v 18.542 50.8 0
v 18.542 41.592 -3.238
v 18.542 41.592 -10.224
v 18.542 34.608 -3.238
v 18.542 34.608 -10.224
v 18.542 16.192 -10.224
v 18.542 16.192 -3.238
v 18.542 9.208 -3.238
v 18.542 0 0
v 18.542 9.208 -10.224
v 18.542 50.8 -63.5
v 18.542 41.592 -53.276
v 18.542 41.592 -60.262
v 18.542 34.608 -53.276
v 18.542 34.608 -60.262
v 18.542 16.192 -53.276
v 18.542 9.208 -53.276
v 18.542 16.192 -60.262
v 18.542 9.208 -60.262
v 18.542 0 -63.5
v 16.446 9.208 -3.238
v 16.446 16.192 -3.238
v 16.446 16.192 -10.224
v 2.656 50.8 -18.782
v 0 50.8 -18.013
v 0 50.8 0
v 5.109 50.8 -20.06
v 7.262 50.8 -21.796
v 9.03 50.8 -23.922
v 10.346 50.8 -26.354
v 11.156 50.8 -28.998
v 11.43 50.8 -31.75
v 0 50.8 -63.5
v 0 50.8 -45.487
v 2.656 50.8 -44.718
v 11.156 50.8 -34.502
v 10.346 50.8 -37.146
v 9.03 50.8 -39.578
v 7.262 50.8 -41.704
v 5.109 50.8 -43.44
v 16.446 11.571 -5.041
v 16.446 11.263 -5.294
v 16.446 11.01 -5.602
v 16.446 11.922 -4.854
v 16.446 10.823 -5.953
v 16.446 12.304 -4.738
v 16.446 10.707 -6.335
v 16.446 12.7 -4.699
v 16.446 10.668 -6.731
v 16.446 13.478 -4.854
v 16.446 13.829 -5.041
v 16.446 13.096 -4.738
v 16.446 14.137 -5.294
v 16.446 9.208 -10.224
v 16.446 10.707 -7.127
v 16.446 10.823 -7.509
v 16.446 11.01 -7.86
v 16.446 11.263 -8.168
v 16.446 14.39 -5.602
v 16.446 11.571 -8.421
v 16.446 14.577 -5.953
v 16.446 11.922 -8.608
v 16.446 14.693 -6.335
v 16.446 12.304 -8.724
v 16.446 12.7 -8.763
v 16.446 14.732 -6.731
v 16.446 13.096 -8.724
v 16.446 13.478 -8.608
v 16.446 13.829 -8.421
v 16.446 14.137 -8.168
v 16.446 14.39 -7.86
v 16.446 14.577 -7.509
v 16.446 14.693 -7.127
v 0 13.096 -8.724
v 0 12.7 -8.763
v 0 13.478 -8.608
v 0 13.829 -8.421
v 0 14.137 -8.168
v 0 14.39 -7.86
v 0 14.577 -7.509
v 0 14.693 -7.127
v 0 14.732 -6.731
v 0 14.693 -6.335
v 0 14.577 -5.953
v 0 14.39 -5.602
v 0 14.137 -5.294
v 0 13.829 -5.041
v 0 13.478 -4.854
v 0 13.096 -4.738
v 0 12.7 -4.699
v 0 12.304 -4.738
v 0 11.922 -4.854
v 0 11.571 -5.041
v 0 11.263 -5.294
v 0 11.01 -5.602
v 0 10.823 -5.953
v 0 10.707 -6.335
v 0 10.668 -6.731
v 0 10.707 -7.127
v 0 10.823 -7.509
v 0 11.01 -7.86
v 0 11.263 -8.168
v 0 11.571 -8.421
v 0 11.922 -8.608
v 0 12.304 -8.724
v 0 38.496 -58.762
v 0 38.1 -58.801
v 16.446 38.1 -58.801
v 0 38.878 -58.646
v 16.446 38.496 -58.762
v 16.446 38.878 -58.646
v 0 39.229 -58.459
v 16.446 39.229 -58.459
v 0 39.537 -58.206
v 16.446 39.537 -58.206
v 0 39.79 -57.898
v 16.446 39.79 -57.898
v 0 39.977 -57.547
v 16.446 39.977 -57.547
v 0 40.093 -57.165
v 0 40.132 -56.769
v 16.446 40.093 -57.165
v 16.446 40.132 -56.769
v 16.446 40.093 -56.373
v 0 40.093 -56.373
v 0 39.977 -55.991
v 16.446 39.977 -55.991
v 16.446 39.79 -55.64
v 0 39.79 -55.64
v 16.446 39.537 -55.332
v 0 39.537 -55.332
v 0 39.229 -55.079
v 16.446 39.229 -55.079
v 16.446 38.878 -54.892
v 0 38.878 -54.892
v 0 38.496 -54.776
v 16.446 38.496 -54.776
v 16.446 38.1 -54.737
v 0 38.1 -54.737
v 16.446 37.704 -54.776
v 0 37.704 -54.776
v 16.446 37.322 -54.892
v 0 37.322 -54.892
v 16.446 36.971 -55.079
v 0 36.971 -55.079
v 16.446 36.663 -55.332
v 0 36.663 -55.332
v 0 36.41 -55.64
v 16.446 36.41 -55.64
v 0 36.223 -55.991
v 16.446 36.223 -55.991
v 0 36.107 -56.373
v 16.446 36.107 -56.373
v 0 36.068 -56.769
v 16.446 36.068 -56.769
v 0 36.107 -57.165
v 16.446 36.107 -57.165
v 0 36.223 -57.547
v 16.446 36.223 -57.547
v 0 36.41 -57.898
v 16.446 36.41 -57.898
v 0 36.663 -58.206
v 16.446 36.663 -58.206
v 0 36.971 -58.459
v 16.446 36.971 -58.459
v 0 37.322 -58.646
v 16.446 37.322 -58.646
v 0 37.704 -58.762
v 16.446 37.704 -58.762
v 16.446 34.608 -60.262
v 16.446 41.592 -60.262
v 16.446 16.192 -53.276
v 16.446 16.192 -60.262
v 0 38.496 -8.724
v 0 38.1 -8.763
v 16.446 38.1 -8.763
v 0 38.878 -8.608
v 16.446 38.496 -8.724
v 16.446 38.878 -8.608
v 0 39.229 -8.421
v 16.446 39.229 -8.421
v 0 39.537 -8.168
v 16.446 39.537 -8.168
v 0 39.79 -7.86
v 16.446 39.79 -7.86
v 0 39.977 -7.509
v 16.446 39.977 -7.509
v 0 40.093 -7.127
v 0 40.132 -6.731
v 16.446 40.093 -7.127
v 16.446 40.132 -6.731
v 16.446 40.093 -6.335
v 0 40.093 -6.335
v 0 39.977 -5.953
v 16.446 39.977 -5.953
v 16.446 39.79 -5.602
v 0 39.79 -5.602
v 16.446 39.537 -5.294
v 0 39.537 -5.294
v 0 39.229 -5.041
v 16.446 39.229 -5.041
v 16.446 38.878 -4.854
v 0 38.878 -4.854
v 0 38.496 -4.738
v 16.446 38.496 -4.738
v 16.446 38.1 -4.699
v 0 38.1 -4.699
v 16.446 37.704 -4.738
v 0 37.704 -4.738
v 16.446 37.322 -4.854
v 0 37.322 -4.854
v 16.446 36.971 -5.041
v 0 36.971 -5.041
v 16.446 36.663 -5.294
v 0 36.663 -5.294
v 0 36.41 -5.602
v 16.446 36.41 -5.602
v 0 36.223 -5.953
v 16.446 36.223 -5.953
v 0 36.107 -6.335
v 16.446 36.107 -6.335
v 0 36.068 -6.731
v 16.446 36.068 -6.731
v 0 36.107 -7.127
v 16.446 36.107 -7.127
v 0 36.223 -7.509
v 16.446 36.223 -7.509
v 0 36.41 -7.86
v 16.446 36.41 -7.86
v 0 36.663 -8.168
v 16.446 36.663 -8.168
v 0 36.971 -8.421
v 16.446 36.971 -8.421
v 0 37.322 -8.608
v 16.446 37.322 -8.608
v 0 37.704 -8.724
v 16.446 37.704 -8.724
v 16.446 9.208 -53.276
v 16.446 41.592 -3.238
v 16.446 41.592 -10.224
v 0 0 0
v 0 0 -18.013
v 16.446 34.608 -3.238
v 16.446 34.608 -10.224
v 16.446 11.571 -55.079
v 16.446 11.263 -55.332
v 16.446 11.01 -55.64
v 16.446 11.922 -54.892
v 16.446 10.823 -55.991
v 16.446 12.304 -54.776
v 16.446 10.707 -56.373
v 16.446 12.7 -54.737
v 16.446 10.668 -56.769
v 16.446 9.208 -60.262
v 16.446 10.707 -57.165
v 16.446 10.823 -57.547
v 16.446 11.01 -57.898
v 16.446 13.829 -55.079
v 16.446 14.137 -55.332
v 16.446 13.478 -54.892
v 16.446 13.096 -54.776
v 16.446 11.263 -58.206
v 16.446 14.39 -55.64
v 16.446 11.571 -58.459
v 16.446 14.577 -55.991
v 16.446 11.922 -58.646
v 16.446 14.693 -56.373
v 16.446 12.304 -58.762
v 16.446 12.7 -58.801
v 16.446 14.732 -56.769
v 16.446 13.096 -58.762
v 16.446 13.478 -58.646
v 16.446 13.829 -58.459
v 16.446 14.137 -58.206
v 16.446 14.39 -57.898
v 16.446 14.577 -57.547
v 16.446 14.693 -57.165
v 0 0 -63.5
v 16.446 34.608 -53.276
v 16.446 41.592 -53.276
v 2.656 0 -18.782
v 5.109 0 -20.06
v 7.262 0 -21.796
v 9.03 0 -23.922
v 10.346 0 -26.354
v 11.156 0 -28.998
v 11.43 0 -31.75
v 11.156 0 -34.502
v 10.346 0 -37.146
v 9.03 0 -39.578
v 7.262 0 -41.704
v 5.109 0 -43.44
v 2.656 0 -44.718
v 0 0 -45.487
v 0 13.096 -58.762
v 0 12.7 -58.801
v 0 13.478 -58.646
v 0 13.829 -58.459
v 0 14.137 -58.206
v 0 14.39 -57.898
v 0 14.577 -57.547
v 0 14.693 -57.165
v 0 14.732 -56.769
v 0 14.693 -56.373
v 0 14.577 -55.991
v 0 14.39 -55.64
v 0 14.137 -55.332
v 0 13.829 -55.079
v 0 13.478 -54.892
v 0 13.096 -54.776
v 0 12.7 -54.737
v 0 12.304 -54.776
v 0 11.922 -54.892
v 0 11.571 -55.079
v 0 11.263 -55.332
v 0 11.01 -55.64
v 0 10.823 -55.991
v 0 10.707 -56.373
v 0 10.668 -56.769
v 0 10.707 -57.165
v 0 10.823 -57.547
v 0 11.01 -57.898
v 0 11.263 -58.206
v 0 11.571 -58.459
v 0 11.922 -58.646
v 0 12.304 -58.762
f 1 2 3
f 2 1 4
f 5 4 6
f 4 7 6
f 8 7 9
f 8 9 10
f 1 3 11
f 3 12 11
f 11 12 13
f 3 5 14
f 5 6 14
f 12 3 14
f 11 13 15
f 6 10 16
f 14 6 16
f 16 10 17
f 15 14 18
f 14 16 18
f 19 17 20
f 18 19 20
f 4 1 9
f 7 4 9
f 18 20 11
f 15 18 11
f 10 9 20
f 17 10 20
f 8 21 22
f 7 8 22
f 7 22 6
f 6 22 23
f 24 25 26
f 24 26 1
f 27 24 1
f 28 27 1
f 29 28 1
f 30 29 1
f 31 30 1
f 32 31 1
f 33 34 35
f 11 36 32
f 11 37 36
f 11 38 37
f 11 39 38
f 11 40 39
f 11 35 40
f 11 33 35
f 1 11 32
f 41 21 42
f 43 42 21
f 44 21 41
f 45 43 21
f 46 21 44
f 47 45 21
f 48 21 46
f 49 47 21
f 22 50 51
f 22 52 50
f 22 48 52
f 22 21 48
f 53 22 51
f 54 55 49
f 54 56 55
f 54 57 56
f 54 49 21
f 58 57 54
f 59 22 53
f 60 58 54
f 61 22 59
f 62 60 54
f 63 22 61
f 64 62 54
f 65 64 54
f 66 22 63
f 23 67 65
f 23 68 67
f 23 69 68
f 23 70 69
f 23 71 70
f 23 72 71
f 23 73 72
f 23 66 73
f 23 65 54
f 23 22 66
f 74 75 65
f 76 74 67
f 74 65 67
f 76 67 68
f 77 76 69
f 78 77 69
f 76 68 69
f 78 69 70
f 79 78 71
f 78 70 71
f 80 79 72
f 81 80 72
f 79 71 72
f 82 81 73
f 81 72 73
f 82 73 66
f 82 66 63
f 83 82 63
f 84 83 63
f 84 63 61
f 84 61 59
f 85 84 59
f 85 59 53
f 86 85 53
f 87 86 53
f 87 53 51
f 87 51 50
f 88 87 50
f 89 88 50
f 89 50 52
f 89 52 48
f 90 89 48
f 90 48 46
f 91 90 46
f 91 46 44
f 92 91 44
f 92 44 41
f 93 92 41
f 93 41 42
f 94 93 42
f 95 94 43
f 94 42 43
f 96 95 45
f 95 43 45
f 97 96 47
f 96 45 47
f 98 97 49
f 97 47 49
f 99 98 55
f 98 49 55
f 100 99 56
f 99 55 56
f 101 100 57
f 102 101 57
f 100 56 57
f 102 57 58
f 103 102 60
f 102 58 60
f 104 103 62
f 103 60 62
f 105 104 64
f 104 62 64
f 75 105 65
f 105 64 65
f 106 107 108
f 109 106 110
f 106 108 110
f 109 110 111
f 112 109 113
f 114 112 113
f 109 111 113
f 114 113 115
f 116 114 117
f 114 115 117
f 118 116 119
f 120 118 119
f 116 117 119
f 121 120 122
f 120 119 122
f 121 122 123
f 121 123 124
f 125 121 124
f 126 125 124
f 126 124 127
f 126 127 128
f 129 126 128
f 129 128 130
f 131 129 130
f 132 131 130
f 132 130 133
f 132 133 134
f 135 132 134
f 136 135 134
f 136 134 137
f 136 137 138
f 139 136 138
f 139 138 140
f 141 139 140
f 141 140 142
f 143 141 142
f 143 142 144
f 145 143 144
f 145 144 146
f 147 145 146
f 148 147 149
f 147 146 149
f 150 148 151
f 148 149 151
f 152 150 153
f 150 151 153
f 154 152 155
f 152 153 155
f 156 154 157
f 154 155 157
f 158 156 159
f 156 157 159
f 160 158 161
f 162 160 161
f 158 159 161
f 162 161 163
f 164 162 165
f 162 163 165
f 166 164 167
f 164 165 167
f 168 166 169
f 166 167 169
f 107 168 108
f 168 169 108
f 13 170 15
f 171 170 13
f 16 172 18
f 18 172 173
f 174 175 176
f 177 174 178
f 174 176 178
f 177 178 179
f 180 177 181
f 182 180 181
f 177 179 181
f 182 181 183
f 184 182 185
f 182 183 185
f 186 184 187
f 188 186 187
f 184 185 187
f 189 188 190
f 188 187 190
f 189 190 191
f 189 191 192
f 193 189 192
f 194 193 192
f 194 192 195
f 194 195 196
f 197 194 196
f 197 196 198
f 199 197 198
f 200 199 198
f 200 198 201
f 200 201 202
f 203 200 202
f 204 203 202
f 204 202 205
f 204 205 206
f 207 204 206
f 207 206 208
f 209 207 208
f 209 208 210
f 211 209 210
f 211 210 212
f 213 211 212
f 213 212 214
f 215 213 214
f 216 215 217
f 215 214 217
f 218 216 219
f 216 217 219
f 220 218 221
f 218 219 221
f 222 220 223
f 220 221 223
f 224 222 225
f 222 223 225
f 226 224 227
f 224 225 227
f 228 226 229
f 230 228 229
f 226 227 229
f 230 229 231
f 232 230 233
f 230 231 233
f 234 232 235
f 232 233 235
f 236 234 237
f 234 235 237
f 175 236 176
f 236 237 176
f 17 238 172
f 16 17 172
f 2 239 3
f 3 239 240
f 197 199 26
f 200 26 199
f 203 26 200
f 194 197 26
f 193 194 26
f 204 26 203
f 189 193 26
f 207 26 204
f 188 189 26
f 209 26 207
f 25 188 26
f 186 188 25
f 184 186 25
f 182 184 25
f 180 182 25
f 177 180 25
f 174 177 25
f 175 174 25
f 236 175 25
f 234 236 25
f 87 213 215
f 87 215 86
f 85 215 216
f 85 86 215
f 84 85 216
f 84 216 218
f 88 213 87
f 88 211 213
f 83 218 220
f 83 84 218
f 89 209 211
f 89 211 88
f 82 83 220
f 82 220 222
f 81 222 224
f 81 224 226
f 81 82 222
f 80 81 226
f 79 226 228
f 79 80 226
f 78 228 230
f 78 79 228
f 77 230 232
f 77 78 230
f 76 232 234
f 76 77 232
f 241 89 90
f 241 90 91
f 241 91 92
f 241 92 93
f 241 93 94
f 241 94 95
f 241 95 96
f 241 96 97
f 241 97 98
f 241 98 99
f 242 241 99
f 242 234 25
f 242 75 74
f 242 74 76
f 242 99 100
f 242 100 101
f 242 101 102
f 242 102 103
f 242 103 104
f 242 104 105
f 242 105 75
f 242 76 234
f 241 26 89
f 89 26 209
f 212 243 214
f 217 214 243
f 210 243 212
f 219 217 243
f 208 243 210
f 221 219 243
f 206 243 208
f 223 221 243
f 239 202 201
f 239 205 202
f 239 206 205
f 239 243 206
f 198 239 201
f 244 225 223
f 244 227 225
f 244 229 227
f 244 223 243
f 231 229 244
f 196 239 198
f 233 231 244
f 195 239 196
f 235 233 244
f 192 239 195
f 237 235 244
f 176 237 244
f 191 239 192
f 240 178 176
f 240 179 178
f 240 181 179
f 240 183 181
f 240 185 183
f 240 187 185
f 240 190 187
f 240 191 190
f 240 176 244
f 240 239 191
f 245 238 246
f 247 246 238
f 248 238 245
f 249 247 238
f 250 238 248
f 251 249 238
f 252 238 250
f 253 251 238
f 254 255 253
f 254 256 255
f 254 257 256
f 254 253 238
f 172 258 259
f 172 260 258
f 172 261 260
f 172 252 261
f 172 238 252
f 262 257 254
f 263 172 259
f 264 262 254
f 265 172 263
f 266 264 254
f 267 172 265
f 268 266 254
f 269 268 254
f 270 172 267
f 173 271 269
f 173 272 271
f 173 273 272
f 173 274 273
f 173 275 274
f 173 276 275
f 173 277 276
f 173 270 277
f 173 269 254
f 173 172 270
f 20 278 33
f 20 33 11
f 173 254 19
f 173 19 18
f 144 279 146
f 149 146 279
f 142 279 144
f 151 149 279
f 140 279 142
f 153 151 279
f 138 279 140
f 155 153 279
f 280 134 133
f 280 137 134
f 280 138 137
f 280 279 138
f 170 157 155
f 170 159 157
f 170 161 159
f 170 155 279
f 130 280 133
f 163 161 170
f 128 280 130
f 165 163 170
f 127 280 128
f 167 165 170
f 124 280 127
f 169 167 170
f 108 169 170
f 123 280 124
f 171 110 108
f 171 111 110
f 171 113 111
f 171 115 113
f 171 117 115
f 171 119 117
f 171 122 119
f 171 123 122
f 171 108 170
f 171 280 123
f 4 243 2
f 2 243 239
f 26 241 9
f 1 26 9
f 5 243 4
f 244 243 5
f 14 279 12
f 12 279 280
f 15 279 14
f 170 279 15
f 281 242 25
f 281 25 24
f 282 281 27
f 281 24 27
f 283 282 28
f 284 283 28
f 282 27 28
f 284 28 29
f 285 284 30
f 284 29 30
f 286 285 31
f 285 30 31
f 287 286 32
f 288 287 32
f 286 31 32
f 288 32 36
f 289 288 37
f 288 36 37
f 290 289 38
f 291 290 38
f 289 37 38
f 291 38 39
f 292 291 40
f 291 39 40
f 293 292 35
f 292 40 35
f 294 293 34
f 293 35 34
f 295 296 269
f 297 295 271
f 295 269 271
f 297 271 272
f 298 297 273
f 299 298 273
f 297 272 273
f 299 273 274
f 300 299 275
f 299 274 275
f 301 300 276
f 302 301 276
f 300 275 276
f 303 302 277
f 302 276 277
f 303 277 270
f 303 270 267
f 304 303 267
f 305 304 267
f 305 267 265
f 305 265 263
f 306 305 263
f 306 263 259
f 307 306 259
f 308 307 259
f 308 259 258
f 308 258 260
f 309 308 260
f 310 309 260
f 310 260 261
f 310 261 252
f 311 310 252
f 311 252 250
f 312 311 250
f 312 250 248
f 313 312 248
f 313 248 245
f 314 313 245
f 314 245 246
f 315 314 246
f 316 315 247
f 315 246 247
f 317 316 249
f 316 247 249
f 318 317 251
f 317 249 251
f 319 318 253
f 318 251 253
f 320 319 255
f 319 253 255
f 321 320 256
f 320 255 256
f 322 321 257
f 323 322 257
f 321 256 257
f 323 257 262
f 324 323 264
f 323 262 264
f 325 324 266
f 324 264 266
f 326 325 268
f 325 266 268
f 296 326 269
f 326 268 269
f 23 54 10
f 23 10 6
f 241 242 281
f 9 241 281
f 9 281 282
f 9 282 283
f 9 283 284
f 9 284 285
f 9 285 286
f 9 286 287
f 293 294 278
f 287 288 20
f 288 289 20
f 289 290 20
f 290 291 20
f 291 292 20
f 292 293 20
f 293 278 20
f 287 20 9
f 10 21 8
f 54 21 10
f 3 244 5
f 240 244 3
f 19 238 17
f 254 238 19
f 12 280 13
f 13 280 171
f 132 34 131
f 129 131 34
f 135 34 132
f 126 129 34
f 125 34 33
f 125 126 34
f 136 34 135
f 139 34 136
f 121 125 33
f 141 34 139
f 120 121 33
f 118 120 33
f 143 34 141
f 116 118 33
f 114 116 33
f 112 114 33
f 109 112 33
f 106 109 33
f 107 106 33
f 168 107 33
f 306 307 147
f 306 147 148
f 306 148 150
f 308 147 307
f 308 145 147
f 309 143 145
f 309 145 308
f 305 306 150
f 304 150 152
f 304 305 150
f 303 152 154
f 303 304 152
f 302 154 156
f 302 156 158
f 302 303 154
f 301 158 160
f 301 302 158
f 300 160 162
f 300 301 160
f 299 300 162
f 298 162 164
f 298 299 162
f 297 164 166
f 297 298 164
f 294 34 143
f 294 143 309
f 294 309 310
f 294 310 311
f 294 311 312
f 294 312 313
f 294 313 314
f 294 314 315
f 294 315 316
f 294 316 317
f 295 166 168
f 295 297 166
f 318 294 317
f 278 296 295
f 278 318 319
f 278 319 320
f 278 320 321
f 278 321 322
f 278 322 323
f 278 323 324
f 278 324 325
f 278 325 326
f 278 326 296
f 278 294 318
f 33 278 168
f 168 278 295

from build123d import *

# Parameters (mm, degrees)
SKETCH1_W           = 18.542
SKETCH1_H           = 63.5
BOSS_EXTRUDE1_DEPTH = 50.8
CUT_EXTRUDE1_DEPTH  = 50.8
SKETCH4_R           = 2.032
CUT_EXTRUDE3_DEPTH  = 18.542
CUT_EXTRUDE4_START  = -2.0955
SKETCH6_W           = 6.985
SKETCH6_H           = 6.985
CUT_EXTRUDE4_DEPTH  = 2.0955


with BuildPart() as part:
    # Sketch1 → Boss-Extrude1 (new body)
    with BuildSketch(Plane(origin=(0, 0, 0), x_dir=(1, 0, 0), z_dir=(0, 1, 0))):
        with Locations((9.271, 31.75)):
            Rectangle(SKETCH1_W, SKETCH1_H)
    extrude(amount=BOSS_EXTRUDE1_DEPTH)

    # Sketch2 → Cut-Extrude1 (cut)
    with BuildSketch(Plane(origin=(0, 50.8, 0), x_dir=(1, 0, 0), z_dir=(0, 1, 0))):
        with BuildLine():
            Line((-2.54, 45.72), (-2.54, 17.78))
            ThreePointArc((-2.54, 17.78), (11.43, 31.75), (-2.54, 45.72))
        make_face()
    extrude(amount=-CUT_EXTRUDE1_DEPTH, mode=Mode.SUBTRACT)

    # Sketch4 → Cut-Extrude3 (cut)
    with BuildSketch(Plane(origin=(18.542, 0, 0), x_dir=(0, 0, -1), z_dir=(1, 0, 0))):
        with Locations((56.769, 38.1)):
            Circle(SKETCH4_R)
        with Locations((56.769, 12.7)):
            Circle(SKETCH4_R)
        with Locations((6.731, 38.1)):
            Circle(SKETCH4_R)
        with Locations((6.731, 12.7)):
            Circle(SKETCH4_R)
    extrude(amount=-CUT_EXTRUDE3_DEPTH, mode=Mode.SUBTRACT)

    # Sketch6 → Cut-Extrude4 (cut)
    with BuildSketch(Plane(origin=(18.542, 0, 0), x_dir=(0, 0, -1), z_dir=(1, 0, 0)).offset(CUT_EXTRUDE4_START)):
        with Locations((56.769, 38.1)):
            Rectangle(SKETCH6_W, SKETCH6_H)
        with Locations((56.769, 12.7)):
            Rectangle(SKETCH6_W, SKETCH6_H)
        with Locations((6.731, 38.1)):
            Rectangle(SKETCH6_W, SKETCH6_H)
        with Locations((6.731, 12.7)):
            Rectangle(SKETCH6_W, SKETCH6_H)
    extrude(amount=CUT_EXTRUDE4_DEPTH, mode=Mode.SUBTRACT)


solid = part.part
